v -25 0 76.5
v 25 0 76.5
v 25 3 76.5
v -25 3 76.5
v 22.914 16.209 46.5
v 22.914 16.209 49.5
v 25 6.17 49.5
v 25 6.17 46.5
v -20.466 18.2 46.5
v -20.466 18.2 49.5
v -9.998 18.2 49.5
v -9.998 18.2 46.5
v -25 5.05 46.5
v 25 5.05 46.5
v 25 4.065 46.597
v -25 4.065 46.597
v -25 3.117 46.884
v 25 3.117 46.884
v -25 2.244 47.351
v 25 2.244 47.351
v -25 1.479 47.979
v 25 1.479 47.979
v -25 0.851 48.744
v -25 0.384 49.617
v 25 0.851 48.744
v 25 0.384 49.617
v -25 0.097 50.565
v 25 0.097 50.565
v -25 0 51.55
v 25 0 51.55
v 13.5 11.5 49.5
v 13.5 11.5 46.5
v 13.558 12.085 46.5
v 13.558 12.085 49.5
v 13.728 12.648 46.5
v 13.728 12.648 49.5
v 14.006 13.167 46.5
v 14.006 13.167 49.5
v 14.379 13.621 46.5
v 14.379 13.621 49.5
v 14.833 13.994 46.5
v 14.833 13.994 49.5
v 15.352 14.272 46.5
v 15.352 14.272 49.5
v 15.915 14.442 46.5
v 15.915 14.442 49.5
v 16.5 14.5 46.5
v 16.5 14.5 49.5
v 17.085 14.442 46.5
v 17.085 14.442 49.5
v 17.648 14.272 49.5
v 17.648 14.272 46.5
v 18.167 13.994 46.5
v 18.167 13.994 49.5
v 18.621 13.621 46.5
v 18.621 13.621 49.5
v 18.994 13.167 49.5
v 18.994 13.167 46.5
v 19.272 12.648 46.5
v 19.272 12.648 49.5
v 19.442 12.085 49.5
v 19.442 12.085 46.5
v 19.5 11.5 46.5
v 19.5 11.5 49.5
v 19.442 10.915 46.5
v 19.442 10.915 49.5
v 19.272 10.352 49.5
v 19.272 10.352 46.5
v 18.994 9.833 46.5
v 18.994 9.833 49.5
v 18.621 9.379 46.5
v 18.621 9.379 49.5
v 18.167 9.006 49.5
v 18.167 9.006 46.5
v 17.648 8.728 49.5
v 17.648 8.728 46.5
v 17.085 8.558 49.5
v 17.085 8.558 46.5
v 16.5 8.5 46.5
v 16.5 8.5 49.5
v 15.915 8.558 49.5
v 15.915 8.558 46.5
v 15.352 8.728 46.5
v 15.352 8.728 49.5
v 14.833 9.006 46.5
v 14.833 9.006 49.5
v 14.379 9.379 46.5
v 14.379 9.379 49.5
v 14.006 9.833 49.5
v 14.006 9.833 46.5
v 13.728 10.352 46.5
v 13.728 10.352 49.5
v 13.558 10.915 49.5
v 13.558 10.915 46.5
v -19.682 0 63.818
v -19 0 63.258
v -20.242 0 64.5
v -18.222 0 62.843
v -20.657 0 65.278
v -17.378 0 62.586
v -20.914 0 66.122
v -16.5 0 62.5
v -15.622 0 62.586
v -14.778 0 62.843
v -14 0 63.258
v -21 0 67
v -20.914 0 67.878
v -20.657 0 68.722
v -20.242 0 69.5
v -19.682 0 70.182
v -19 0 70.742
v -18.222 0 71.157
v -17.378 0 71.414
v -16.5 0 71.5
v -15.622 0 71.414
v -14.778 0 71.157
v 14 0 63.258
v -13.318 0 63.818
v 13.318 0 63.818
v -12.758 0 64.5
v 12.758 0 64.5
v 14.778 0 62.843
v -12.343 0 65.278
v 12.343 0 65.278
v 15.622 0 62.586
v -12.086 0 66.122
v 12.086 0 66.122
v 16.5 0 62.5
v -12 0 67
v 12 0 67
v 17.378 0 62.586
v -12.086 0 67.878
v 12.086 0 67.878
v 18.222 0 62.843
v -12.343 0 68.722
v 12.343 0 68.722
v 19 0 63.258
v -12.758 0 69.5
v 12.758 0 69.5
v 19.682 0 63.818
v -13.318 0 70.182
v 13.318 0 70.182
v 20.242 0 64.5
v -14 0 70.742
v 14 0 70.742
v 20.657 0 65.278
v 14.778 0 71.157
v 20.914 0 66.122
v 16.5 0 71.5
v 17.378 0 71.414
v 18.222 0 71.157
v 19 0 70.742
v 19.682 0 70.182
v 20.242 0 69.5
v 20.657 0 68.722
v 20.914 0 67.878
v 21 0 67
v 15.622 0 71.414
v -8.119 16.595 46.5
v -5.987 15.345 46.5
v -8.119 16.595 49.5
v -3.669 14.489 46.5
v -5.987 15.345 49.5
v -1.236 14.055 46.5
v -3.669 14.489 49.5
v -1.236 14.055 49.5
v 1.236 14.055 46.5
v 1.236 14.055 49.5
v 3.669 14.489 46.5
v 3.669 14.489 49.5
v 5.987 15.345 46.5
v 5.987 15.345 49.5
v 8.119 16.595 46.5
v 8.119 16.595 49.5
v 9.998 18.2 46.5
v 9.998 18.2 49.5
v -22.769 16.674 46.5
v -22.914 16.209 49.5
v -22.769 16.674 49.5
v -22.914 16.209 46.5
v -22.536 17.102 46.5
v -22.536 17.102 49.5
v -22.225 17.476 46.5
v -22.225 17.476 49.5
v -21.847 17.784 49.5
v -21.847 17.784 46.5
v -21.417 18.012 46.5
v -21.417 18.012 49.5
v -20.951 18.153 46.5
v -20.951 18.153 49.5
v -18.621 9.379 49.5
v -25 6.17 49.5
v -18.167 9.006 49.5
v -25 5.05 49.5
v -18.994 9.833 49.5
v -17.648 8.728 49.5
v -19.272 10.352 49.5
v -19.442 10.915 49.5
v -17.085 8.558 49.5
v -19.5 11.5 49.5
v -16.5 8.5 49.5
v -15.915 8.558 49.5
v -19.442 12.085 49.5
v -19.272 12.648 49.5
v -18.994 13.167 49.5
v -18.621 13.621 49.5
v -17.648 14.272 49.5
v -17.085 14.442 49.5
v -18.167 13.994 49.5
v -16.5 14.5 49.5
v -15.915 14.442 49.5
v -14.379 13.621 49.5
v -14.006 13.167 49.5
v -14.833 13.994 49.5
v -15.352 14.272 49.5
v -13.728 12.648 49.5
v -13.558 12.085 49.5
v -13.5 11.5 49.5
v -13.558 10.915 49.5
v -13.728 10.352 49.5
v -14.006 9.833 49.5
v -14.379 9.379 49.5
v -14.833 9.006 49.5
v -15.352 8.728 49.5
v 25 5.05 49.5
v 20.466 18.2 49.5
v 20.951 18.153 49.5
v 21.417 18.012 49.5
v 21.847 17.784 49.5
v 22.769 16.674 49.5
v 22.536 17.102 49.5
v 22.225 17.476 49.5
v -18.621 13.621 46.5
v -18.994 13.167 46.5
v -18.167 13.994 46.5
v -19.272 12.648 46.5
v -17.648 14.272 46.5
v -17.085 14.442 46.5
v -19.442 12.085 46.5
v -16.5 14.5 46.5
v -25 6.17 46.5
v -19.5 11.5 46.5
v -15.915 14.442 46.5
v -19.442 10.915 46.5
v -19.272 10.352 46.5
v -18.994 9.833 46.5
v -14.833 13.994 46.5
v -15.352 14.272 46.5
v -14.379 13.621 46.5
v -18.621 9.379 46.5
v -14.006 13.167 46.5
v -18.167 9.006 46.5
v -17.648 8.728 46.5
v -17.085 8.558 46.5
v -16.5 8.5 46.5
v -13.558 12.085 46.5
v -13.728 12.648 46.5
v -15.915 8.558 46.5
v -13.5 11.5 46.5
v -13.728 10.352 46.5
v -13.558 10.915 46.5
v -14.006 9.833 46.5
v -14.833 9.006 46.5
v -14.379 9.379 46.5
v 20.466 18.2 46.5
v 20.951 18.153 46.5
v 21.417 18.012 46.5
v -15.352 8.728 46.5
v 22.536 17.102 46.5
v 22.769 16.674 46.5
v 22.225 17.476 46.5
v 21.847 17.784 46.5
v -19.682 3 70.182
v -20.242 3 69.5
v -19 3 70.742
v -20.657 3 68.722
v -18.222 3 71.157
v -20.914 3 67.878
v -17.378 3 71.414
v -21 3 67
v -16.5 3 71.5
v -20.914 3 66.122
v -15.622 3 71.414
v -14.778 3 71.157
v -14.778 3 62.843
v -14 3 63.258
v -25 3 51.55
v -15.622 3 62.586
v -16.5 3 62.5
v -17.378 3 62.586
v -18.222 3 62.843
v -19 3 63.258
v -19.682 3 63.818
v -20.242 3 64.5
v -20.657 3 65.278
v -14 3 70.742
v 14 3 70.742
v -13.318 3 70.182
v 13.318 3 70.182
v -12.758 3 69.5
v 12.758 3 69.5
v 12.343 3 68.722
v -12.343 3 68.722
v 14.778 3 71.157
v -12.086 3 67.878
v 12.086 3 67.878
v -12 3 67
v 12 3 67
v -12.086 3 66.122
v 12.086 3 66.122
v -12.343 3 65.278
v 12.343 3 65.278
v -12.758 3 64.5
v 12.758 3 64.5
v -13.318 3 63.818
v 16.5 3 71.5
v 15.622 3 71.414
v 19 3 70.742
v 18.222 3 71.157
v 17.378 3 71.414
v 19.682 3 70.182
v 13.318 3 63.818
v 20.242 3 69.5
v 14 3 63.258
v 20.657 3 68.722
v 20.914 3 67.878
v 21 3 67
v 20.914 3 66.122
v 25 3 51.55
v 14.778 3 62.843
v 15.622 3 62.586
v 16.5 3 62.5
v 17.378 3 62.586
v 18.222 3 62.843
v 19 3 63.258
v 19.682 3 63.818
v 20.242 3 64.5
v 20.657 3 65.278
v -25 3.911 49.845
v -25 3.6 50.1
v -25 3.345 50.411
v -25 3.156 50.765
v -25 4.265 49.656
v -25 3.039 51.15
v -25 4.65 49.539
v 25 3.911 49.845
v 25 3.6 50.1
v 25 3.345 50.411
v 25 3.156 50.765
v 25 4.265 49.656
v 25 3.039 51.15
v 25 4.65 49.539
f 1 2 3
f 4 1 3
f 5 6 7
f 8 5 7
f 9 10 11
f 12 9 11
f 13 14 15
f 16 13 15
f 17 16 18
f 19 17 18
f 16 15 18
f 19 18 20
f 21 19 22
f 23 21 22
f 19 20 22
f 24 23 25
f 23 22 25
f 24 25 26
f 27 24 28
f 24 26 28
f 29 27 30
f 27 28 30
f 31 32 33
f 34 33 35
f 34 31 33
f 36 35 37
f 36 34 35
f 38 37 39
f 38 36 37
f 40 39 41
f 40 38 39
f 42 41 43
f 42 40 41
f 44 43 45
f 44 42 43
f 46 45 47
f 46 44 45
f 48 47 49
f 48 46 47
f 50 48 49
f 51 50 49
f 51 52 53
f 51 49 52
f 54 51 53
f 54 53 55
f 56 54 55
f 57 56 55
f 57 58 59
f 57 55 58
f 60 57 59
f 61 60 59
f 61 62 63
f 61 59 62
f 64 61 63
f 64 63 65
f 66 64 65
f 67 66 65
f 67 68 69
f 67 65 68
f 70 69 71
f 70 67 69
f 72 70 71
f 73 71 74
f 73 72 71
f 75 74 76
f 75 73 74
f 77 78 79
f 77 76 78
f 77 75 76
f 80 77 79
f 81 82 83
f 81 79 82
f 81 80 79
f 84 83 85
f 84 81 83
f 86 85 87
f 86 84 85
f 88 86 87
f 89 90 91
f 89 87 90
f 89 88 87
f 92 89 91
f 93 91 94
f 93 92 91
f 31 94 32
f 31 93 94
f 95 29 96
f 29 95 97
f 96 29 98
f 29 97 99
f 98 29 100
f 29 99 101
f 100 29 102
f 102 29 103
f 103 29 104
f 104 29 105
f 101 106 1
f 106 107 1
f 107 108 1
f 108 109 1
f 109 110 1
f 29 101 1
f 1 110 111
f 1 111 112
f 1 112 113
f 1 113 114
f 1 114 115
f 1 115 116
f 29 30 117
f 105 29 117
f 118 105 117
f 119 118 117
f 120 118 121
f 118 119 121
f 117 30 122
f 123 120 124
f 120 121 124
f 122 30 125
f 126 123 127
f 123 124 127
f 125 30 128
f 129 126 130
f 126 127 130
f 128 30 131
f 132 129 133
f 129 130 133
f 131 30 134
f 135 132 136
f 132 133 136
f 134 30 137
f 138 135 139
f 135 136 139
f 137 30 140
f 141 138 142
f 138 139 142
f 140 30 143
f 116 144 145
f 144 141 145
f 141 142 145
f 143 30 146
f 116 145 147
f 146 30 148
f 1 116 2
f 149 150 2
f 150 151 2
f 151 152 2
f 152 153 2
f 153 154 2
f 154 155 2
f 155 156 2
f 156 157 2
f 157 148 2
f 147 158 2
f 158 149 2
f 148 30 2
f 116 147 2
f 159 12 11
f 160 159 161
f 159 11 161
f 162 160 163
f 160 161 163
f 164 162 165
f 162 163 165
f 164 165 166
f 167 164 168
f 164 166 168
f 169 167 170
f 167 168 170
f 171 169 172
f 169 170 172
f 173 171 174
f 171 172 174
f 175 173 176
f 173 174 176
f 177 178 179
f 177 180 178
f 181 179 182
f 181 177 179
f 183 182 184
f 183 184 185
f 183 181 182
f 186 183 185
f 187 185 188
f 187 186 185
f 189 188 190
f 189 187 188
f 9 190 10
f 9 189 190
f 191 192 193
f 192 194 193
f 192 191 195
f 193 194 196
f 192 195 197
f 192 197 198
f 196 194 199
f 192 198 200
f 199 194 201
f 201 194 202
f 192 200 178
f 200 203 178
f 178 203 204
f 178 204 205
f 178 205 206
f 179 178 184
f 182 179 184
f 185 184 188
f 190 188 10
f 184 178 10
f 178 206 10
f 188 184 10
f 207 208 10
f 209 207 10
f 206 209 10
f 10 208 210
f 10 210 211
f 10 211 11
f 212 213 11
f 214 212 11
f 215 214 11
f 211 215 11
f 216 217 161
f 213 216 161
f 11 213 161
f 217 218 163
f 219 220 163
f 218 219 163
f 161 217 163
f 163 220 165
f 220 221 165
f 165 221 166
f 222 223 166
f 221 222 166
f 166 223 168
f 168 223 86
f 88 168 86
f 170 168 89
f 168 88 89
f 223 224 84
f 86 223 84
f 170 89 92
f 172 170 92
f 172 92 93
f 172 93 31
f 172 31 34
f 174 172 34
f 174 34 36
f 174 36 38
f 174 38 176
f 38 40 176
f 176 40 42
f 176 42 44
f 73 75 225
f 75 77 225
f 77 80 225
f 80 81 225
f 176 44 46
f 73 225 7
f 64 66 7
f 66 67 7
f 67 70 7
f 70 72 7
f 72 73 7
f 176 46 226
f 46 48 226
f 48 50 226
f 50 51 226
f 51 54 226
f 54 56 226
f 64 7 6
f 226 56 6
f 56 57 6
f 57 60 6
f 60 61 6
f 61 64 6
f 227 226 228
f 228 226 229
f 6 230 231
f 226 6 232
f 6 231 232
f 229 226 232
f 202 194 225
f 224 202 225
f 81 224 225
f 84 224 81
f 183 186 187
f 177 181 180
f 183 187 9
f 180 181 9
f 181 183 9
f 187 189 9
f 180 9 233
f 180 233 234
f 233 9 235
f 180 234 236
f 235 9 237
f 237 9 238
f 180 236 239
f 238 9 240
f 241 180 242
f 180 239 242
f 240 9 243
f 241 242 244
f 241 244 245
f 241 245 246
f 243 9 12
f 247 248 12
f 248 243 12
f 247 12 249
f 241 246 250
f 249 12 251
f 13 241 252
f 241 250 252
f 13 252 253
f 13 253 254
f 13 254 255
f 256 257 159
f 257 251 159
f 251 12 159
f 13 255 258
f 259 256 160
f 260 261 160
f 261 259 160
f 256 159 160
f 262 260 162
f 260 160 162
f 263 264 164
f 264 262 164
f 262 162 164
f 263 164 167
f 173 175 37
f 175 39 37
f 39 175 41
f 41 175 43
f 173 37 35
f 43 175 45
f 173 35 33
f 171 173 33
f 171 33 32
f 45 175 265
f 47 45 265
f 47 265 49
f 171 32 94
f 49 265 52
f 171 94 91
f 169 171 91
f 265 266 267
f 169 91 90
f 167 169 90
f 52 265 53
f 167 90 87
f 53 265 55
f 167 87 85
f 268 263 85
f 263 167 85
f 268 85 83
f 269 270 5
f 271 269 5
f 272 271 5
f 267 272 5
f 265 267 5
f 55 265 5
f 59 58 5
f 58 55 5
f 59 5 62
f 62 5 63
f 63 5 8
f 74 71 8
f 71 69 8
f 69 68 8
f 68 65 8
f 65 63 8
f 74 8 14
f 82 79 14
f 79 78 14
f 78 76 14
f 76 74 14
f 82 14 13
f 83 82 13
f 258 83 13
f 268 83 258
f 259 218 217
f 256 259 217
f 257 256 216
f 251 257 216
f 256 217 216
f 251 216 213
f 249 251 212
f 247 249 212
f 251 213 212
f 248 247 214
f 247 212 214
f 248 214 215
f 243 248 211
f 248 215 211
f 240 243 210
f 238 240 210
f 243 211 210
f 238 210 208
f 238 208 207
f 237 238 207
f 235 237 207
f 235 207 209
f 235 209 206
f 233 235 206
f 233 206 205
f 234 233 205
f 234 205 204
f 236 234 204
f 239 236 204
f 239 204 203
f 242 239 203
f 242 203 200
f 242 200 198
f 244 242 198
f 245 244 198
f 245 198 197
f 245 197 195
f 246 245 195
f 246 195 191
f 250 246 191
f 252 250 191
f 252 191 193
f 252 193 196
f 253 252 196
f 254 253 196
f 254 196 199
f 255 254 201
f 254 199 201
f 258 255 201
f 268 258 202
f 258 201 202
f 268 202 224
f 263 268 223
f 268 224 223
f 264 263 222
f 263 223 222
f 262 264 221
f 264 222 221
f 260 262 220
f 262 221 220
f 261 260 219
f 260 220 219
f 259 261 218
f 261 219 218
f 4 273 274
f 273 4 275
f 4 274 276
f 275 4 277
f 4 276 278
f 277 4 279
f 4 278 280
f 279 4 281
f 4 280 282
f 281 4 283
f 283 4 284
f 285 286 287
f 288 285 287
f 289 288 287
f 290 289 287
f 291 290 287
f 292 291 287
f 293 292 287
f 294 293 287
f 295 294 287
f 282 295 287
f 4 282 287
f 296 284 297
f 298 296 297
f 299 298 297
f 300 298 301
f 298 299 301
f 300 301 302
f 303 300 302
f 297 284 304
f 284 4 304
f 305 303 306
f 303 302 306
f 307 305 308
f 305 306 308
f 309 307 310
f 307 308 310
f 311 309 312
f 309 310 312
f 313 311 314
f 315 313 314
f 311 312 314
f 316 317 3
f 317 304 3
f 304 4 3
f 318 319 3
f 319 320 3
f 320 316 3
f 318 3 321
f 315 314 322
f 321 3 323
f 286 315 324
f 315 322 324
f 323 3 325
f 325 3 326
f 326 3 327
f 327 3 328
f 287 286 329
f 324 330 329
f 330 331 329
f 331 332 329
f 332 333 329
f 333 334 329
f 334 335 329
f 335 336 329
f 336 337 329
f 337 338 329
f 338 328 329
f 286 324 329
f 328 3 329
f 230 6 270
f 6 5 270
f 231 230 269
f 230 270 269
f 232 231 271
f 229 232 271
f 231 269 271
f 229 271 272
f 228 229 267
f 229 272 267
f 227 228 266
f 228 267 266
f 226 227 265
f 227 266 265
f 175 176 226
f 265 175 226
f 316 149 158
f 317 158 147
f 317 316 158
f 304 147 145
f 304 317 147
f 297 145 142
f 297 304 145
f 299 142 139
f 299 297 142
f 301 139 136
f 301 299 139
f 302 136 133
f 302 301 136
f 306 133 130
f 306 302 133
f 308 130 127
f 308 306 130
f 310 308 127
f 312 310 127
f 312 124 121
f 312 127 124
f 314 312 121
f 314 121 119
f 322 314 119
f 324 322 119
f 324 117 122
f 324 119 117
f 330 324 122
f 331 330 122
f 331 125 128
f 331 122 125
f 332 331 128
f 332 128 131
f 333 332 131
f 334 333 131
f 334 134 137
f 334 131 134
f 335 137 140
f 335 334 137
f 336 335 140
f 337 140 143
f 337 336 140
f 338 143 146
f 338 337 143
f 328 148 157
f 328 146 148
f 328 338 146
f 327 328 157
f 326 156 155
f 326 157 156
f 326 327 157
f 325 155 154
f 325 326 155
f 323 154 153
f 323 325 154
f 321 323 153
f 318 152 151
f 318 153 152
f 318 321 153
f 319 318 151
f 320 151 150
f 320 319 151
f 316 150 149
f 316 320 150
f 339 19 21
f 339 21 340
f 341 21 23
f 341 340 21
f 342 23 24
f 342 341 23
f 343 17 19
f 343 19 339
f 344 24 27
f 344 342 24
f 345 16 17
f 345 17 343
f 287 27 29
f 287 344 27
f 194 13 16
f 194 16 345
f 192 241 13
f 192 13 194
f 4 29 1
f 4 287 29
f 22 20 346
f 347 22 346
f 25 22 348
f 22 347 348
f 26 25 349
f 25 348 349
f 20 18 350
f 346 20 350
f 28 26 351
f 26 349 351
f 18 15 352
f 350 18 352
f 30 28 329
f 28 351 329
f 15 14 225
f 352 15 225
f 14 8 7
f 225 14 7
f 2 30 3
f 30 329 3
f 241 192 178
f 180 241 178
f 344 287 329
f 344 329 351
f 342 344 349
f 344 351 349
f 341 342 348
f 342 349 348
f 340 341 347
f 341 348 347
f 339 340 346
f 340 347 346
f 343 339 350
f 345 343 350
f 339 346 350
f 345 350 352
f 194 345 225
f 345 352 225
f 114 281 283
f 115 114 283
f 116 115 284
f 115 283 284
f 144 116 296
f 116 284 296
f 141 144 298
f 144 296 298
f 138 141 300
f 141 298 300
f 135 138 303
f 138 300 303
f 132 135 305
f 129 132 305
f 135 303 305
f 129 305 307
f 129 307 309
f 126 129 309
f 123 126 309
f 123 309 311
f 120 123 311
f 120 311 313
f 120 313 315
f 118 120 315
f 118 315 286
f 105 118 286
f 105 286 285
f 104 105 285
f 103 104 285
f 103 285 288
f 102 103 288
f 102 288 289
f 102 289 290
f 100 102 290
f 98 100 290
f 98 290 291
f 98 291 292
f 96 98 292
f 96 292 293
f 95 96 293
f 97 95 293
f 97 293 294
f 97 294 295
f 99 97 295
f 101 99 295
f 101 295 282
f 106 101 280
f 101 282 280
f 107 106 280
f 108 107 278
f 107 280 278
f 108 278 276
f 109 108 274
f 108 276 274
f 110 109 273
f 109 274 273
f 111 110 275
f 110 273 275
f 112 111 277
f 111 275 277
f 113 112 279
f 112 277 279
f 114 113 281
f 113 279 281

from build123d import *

# Parameters (mm, degrees)
EXTRUDE_START          = 25
EXTRUDE_1_DEPTH        = 50
SKETCH_4_R             = 4.5
CUT_EXTRUDE_1_DEPTH    = 85.274847968
SKETCH_6_R             = 3
CUT_EXTRUDE_2_DEPTH    = 47.238512087
SKETCH_7_R             = 14
CUT_EXTRUDE_3_DEPTH    = 47.238512087
SKETCH_9_W             = 50
SKETCH_9_H             = 9.8
CUT_EXTRUDE_4_DEPTH    = 47.238512087
CUT_EXTRUDE_1983_DEPTH = 42.051674753
FILLET_1_R             = 2.5


with BuildPart() as part:
    # 草图3 → 凸台-拉伸1 (new body)
    with BuildSketch(Plane(origin=(0, 0, 0), x_dir=(0, 0, -1), z_dir=(1, 0, 0)).offset(EXTRUDE_START)):
        with BuildLine():
            Line((-76.5, 0), (-76.5, 3))
            Line((-76.5, 3), (-51.55, 3))
            ThreePointArc((-51.55, 3), (-50.100431099, 3.600431099), (-49.5, 5.05))
            Line((-49.5, 5.05), (-49.5, 28))
            Line((-49.5, 28), (-46.5, 28))
            Line((-46.5, 28), (-46.5, 5.05))
            ThreePointArc((-46.5, 5.05), (-47.979110755, 1.479110755), (-51.55, 0))
            Line((-51.55, 0), (-76.5, 0))
        make_face()
    extrude(amount=-EXTRUDE_1_DEPTH)

    # 草图4 → 切除-拉伸1 (cut, through all)
    with BuildSketch(Plane(origin=(0, 3, 0), x_dir=(1, 0, 0), z_dir=(0, 1, 0))):
        with Locations(Location((-16.5, -67, 0), (0, 0, 270))):
            Circle(SKETCH_4_R)
    cut_extrude_1 = extrude(amount=-CUT_EXTRUDE_1_DEPTH, mode=Mode.SUBTRACT)

    # 镜向1: 切除-拉伸1 across plane
    add(cut_extrude_1.mirror(Plane(origin=(0, 0, 0), x_dir=(0, 0, 1), z_dir=(1, 0, 0))), mode=Mode.SUBTRACT)

    # 草图6 → 切除-拉伸2 (cut, through all)
    with BuildSketch(Plane.XY.offset(49.5)):
        with Locations((-16.5, 11.5)):
            Circle(SKETCH_6_R)
    cut_extrude_2 = extrude(amount=-CUT_EXTRUDE_2_DEPTH, mode=Mode.SUBTRACT)

    # 镜向2: 切除-拉伸2 across plane
    add(cut_extrude_2.mirror(Plane(origin=(0, 0, 0), x_dir=(0, 0, 1), z_dir=(1, 0, 0))), mode=Mode.SUBTRACT)

    # 草图7 → 切除-拉伸3 (cut, through all)
    with BuildSketch(Plane.XY.offset(49.5)):
        with Locations((0, 28)):
            Circle(SKETCH_7_R)
    extrude(amount=-CUT_EXTRUDE_3_DEPTH, mode=Mode.SUBTRACT)

    # 草图9 → 切除-拉伸4 (cut, through all)
    with BuildSketch(Plane.XY.offset(49.5)):
        with Locations((0, 23.1)):
            Rectangle(SKETCH_9_W, SKETCH_9_H)
    extrude(amount=-CUT_EXTRUDE_4_DEPTH, mode=Mode.SUBTRACT)

    # 草图8 → Cut-Extrude 1983 (cut, through all)
    with BuildSketch(Plane.XY.offset(49.5)):
        Polygon((-22.5, 18.2), (22.5, 18.2), (25, 6.17), (25, 28), (-25, 28), (-25, 6.17), align=None)
    extrude(amount=-CUT_EXTRUDE_1983_DEPTH, mode=Mode.SUBTRACT)

    # 圆角1
    fillet_1_edges = [part.edges().sort_by_distance(p)[0] for p in [
        (22.5, 18.2, 48),
        (-22.5, 18.2, 48),
    ]]
    fillet(fillet_1_edges, radius=FILLET_1_R)


solid = part.part
